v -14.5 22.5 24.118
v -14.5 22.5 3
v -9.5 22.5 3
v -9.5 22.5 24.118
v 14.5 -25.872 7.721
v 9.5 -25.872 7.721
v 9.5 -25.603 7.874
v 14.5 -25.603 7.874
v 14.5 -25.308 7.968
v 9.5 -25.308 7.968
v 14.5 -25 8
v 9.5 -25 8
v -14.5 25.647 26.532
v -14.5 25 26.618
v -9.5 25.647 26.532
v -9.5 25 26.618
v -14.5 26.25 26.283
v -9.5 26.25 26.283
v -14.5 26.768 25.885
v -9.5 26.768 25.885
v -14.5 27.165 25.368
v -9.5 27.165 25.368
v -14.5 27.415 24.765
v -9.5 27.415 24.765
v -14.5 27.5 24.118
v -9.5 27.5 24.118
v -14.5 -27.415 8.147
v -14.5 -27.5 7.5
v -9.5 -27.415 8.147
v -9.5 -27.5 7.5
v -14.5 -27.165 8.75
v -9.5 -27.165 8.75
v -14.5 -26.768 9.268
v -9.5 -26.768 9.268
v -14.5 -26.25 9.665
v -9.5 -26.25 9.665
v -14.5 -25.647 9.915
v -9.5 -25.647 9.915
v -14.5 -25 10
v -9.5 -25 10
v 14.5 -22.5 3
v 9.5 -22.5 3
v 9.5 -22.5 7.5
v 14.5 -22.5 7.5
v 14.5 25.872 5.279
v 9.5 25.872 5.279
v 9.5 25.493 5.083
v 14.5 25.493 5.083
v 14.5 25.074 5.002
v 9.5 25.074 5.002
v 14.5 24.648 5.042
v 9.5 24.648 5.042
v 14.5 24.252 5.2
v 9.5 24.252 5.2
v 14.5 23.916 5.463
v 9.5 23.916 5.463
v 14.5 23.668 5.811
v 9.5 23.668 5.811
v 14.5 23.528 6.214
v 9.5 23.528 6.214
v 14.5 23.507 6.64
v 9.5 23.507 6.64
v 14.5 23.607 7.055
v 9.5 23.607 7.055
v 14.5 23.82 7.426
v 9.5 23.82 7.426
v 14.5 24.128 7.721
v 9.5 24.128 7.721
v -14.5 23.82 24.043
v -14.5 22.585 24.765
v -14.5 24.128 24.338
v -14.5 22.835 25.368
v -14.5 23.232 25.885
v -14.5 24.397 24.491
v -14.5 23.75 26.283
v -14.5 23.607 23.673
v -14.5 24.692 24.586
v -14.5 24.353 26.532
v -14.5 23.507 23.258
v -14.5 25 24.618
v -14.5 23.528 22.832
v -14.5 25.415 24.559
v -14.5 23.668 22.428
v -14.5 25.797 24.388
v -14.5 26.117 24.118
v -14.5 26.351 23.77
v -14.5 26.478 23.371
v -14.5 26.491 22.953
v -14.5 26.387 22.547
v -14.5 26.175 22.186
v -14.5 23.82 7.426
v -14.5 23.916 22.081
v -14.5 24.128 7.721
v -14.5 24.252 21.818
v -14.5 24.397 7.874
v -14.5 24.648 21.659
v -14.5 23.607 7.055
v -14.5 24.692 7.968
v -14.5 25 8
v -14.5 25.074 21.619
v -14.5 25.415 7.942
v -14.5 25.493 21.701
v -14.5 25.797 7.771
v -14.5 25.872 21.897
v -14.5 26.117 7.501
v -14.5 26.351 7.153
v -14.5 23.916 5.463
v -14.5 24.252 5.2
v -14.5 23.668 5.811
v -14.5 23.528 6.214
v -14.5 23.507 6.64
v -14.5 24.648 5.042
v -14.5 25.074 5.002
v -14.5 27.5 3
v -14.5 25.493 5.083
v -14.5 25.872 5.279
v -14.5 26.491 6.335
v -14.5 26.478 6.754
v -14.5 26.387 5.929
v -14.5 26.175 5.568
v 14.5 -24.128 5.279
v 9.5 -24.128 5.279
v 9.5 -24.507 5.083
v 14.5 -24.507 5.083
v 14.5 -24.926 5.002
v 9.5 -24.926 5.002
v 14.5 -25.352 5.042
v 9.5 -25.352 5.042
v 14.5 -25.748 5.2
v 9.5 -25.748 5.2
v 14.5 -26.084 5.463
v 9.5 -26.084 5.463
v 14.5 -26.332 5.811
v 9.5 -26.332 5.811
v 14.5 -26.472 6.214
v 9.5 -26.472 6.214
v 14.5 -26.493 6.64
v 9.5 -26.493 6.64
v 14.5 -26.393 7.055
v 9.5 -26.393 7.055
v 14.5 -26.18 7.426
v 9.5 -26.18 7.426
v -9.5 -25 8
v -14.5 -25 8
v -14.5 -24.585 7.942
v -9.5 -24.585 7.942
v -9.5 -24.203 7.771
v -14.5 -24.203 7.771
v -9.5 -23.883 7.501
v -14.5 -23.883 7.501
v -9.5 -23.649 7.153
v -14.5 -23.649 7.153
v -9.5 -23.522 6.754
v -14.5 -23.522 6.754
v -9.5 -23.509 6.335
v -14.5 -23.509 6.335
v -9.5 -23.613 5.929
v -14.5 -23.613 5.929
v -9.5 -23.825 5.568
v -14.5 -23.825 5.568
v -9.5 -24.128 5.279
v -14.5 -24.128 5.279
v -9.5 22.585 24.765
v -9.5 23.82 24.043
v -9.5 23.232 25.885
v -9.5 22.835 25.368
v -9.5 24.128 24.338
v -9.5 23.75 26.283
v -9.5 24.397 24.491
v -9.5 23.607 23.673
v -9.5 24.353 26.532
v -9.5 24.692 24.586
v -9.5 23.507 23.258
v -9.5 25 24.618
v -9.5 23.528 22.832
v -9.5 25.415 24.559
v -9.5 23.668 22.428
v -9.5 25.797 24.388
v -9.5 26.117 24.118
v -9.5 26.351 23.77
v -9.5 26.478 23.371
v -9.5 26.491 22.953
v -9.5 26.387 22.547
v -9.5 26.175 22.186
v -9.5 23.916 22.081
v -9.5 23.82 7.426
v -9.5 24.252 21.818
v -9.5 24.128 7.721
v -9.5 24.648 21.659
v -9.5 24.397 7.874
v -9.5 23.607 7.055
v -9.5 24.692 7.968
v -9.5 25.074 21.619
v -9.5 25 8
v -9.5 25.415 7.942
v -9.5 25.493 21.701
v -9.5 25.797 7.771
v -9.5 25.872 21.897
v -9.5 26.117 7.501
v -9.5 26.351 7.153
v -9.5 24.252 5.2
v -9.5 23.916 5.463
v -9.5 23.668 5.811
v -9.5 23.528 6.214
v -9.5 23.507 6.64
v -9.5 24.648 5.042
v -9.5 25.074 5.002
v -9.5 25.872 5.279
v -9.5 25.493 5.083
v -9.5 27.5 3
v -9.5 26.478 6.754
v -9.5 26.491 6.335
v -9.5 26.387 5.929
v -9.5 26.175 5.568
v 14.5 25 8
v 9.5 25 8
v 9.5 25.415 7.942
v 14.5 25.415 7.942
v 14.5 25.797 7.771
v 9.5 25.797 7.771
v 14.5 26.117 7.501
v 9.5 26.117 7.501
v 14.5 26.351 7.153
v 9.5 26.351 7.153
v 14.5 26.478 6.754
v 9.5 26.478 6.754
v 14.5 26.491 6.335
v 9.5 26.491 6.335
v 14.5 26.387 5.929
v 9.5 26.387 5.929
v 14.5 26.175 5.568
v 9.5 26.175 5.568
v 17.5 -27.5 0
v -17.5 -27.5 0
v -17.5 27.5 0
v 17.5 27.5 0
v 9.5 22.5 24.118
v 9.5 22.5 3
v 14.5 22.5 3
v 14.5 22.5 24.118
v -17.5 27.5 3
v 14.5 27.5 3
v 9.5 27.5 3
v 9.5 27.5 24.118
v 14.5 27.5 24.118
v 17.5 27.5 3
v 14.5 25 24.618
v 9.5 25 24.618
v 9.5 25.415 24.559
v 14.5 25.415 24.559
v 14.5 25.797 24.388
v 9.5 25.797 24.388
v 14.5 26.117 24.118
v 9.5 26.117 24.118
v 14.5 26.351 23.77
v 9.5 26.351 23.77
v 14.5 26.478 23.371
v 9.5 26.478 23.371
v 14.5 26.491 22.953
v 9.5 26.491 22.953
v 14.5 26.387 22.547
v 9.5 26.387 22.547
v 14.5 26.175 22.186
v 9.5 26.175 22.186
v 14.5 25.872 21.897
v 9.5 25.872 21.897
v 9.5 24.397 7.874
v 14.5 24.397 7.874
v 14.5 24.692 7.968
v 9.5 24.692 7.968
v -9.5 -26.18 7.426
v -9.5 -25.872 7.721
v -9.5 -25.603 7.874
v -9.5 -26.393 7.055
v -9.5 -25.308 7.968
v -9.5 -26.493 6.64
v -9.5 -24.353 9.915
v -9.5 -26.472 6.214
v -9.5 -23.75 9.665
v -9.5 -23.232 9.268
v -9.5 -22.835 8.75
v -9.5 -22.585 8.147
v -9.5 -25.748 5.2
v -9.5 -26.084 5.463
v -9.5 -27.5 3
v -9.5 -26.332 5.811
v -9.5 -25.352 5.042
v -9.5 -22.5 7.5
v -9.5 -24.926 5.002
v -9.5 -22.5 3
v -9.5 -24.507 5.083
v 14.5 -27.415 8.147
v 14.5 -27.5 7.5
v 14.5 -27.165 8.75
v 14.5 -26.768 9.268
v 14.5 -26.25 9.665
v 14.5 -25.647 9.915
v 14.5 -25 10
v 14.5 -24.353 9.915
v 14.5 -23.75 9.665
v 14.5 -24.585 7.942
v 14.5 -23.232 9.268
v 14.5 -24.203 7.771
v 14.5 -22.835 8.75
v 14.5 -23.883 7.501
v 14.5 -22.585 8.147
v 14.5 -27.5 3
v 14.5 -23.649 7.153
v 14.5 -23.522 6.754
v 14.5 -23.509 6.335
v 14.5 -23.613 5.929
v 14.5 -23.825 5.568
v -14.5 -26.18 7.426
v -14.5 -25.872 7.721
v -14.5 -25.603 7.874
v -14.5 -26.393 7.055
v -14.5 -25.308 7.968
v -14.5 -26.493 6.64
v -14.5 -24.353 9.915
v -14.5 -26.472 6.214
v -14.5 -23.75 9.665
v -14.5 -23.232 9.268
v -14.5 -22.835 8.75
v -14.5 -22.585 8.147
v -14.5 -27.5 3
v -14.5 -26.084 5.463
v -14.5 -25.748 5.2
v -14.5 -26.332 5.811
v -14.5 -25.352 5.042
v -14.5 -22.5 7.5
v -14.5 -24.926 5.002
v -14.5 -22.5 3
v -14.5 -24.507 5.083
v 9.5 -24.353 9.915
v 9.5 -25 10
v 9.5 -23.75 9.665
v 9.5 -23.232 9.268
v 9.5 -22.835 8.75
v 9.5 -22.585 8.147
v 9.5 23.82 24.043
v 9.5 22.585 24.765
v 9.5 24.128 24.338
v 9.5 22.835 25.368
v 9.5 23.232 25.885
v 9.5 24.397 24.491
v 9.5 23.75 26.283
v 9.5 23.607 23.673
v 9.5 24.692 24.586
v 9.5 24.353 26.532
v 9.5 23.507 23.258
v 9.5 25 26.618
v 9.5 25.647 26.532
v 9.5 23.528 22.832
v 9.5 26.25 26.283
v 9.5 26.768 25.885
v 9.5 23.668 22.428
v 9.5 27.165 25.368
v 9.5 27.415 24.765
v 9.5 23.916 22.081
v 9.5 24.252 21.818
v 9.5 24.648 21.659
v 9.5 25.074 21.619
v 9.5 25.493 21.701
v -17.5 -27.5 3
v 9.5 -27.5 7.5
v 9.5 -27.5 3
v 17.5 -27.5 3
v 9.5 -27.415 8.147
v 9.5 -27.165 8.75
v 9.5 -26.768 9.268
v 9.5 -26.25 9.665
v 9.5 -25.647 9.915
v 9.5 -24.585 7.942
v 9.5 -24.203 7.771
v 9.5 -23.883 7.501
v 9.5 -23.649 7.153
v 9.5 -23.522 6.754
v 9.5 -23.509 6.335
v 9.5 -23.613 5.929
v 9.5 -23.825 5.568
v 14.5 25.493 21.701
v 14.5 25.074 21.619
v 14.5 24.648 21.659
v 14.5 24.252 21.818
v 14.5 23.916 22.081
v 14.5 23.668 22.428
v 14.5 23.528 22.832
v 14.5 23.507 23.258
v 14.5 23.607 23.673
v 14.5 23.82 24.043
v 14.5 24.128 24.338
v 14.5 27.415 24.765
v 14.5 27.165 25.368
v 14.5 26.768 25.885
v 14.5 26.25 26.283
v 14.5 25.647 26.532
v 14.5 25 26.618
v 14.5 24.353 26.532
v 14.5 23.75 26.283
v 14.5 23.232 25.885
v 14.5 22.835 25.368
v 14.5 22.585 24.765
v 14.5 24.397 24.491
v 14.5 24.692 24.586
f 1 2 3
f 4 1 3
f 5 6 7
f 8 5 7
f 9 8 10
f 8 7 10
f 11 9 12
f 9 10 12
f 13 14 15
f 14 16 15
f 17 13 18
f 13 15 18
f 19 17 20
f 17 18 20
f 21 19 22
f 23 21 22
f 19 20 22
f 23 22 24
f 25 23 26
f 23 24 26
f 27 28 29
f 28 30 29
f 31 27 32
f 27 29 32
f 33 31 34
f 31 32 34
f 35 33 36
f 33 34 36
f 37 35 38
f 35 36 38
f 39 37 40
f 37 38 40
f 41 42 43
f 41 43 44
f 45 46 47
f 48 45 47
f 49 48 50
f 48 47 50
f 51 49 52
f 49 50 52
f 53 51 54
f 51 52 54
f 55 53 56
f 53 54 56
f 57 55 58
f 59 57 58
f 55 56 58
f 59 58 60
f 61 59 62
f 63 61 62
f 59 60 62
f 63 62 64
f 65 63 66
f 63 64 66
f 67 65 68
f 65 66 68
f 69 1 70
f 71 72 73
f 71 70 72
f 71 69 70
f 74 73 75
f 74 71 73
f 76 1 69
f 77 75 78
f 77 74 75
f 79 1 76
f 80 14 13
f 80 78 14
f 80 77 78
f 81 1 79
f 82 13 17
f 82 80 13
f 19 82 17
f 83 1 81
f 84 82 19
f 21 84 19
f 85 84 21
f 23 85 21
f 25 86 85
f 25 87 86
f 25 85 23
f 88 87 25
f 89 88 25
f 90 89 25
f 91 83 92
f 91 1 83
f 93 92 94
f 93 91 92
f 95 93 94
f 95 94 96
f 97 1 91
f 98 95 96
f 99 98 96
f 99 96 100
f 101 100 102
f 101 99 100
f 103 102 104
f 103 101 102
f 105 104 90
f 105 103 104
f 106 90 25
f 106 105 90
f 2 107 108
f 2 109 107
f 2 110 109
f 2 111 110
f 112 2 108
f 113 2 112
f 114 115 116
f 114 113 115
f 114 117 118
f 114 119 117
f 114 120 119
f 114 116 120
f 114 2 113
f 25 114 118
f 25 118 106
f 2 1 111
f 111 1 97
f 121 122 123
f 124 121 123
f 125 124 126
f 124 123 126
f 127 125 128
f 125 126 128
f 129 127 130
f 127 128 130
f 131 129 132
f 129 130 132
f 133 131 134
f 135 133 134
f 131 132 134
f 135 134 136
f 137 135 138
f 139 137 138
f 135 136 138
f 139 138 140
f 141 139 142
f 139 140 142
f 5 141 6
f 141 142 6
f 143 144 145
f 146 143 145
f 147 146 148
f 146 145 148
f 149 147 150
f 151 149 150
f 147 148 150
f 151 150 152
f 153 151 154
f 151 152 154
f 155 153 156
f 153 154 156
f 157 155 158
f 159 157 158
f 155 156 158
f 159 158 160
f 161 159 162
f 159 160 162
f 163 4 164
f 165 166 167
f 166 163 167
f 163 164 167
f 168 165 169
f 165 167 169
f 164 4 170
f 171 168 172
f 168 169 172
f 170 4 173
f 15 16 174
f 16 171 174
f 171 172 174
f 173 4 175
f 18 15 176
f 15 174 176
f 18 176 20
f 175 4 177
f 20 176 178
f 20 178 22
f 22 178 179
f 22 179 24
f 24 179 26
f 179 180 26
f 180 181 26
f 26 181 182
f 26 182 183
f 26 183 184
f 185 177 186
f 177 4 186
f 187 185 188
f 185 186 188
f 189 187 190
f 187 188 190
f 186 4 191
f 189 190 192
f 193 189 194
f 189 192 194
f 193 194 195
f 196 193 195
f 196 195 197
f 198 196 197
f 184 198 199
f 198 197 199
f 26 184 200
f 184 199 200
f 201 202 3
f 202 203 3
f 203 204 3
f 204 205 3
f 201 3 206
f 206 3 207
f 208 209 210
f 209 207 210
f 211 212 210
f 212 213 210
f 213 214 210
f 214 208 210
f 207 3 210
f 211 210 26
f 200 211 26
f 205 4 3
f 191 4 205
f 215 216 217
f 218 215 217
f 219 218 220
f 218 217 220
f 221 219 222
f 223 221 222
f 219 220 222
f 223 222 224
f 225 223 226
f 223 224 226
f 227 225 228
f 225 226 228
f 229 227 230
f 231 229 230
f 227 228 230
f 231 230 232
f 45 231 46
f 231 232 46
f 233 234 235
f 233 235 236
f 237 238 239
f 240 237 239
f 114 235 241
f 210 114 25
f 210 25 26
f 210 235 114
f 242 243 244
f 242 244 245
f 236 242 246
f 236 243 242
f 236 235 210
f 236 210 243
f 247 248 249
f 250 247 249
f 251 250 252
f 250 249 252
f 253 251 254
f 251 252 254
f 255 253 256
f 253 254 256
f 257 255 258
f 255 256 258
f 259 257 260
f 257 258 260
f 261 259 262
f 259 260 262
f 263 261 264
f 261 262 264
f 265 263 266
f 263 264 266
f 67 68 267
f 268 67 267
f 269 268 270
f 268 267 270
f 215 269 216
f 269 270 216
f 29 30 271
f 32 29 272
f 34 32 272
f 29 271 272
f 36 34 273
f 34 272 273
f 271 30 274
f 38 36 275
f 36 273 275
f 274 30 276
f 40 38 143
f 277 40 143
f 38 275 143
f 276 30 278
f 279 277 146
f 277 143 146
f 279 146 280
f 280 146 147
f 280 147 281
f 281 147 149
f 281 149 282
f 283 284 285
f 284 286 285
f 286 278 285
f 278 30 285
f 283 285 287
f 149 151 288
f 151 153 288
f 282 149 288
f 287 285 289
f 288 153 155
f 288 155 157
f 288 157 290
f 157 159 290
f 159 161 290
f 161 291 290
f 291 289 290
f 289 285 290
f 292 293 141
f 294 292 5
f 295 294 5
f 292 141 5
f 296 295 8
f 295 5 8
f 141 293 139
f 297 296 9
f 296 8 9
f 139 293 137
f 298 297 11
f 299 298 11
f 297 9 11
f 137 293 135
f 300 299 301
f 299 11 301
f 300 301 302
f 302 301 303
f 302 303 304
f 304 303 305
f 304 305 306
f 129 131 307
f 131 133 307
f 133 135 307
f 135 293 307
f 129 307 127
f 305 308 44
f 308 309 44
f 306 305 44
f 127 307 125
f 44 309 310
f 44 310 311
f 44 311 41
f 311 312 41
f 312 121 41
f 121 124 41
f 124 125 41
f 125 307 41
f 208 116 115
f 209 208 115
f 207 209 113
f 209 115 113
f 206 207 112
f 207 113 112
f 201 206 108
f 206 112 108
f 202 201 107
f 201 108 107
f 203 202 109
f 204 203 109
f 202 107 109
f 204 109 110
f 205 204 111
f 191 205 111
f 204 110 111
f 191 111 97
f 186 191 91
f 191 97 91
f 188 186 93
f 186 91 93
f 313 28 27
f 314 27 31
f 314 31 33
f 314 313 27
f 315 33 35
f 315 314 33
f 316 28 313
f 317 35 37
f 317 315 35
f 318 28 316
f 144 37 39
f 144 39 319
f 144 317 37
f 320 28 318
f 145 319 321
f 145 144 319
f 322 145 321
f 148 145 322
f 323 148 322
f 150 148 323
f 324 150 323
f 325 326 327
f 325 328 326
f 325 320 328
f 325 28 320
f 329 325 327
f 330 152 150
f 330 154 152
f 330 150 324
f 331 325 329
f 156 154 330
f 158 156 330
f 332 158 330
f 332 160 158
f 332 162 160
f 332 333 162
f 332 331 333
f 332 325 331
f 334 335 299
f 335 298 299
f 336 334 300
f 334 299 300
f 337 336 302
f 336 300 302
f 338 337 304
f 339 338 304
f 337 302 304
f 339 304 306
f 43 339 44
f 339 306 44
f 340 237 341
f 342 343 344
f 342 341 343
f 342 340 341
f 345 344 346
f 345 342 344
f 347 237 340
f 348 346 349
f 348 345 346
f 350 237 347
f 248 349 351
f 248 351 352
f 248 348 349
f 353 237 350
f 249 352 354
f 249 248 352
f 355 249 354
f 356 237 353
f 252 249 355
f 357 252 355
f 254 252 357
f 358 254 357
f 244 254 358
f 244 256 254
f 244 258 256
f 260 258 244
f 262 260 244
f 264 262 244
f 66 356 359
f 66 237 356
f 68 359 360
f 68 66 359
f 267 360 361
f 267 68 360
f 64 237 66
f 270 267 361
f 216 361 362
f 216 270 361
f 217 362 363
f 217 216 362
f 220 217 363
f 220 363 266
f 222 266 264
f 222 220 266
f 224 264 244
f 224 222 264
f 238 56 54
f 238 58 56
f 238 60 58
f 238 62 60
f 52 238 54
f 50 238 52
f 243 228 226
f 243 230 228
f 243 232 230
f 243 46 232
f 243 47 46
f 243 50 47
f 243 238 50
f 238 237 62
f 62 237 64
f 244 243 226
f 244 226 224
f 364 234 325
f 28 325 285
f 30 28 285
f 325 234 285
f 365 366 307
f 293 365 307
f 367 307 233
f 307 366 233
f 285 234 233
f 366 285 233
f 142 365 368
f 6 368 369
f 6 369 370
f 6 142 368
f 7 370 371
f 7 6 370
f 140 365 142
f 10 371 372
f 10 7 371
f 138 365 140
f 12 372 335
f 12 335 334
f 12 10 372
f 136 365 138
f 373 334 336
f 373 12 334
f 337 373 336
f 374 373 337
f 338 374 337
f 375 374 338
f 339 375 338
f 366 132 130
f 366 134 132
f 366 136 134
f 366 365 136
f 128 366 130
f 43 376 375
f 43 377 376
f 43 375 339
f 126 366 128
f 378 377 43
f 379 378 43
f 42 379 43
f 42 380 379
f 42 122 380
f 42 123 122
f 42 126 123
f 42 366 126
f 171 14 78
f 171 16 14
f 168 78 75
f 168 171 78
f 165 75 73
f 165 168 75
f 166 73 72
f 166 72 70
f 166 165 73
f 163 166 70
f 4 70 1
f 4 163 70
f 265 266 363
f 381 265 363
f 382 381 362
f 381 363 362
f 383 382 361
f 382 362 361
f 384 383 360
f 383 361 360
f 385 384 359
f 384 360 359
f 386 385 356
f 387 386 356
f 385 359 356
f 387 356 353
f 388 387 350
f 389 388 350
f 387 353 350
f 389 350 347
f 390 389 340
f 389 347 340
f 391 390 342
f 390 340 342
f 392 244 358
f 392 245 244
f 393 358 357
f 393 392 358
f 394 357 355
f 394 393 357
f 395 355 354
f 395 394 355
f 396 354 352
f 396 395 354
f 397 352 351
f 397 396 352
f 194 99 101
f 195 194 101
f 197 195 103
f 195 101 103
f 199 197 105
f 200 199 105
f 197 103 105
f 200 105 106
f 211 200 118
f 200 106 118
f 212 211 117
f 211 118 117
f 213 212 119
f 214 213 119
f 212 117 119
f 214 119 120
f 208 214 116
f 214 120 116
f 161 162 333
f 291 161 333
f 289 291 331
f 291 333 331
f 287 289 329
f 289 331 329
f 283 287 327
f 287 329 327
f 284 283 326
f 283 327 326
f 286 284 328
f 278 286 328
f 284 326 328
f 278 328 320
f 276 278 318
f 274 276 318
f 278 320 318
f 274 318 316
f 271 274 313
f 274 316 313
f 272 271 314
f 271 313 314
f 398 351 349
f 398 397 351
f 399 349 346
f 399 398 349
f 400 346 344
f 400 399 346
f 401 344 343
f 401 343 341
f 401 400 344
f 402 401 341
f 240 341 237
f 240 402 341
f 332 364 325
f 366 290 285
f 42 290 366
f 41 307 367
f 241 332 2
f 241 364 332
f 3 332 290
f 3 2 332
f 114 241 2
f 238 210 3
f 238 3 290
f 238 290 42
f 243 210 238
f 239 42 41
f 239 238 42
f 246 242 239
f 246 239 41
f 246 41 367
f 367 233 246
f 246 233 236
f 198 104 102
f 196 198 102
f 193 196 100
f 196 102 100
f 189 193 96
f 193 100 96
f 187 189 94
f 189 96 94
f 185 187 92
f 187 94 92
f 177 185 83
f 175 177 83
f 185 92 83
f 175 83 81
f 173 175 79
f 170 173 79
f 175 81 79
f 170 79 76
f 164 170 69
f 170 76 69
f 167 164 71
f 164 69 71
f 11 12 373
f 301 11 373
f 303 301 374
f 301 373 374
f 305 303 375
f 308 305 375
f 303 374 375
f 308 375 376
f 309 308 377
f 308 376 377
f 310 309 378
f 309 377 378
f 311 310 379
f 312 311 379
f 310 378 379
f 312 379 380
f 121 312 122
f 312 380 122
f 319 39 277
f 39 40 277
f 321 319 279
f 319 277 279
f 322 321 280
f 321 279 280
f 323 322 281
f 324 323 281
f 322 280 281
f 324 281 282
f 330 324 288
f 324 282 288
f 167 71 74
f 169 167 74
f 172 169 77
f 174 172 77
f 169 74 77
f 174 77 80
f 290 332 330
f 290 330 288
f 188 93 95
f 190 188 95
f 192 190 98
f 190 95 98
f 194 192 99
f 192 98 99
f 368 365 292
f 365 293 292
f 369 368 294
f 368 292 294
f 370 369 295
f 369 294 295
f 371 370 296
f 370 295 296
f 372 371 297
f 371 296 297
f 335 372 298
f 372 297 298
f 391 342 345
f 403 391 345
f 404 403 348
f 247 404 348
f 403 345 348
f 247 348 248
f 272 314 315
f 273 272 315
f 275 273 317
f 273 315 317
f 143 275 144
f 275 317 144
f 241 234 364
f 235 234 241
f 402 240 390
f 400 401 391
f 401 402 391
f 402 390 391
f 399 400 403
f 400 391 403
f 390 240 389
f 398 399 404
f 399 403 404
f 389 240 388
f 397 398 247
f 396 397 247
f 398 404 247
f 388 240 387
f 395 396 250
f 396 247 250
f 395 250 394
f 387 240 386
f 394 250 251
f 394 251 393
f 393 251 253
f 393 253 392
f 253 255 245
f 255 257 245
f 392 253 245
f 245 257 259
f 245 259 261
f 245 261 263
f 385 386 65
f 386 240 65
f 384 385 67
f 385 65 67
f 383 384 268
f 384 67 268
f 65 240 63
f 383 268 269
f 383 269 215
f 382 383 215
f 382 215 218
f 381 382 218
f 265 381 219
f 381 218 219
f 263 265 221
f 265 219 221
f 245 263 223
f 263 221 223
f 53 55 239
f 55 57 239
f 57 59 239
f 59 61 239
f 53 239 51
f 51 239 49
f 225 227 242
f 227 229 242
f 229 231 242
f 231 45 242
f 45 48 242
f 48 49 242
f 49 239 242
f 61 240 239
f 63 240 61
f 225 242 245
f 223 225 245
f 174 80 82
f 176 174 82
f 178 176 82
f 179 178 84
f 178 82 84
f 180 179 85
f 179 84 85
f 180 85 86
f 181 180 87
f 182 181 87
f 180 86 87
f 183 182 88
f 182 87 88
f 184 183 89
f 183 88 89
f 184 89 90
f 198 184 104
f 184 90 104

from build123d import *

# Parameters (mm, degrees)
SKETCH1_W           = 35
SKETCH1_H           = 55
BOSS_EXTRUDE1_DEPTH = 3
SKETCH2_W           = 5
SKETCH2_H           = 5
BOSS_EXTRUDE2_DEPTH = 7
CUT_EXTRUDE1_REACH  = 45.362
FILLET1_R           = 2.5
SKETCH4_W           = 5
SKETCH4_H           = 5
BOSS_EXTRUDE3_DEPTH = 16.61764706
CUT_EXTRUDE2_REACH  = 51.887
FILLET2_R           = 2.5


with BuildPart() as part:
    # Sketch1 → Boss-Extrude1 (new body)
    with BuildSketch(Plane.XY):
        Rectangle(SKETCH1_W, SKETCH1_H)
    extrude(amount=BOSS_EXTRUDE1_DEPTH)

    # Sketch2 → Boss-Extrude2 (add)
    with BuildSketch(Plane.XY.offset(3)):
        with Locations((-12, 25)):
            Rectangle(SKETCH2_W, SKETCH2_H)
        with Locations((12, 25)):
            Rectangle(SKETCH2_W, SKETCH2_H)
        with Locations((-12, -25)):
            Rectangle(SKETCH2_W, SKETCH2_H)
        with Locations((12, -25)):
            Rectangle(SKETCH2_W, SKETCH2_H)
    extrude(amount=BOSS_EXTRUDE2_DEPTH)

    # Cut-Extrude1: up to this face of the body (flat: up to its plane)
    cut_extrude1_end = Plane(part.part.faces().sort_by_distance((14.5, 25, 6.5))[0])
    # Sketch3 → Cut-Extrude1 (cut, up to the picked face)
    with BuildSketch(Plane.ZY.offset(14.5), mode=Mode.PRIVATE) as cut_extrude1_sk1:
        with BuildLine():
            ThreePointArc((8, 25), (6.957766147, 26.428443263), (5.279399793, 25.871857291))
            Line((5.279399793, 25.871857291), (7.720600207, 24.128142709))
            ThreePointArc((7.720600207, 24.128142709), (7.928443263, 24.542233853), (8, 25))
        make_face()
    cut_extrude1_tool1 = split(extrude(cut_extrude1_sk1.sketch, amount=-CUT_EXTRUDE1_REACH, mode=Mode.PRIVATE), bisect_by=cut_extrude1_end, keep=Keep.BOTH, mode=Mode.PRIVATE)
    # Sketch3 → Cut-Extrude1 (cut, up to the picked face)
    with BuildSketch(Plane.ZY.offset(14.5), mode=Mode.PRIVATE) as cut_extrude1_sk2:
        with BuildLine():
            Line((7.720600207, 24.128142709), (5.279399793, 25.871857291))
            ThreePointArc((5.279399793, 25.871857291), (5.628142709, 23.779399793), (7.720600207, 24.128142709))
        make_face()
    cut_extrude1_tool2 = split(extrude(cut_extrude1_sk2.sketch, amount=-CUT_EXTRUDE1_REACH, mode=Mode.PRIVATE), bisect_by=cut_extrude1_end, keep=Keep.BOTH, mode=Mode.PRIVATE)
    # Sketch3 → Cut-Extrude1 (cut, up to the picked face)
    with BuildSketch(Plane.ZY.offset(14.5), mode=Mode.PRIVATE) as cut_extrude1_sk3:
        with BuildLine():
            ThreePointArc((8, 25), (6.957766147, 26.428443263), (5.279399793, 25.871857291))
            Line((5.279399793, 25.871857291), (7.720600207, 24.128142709))
            ThreePointArc((7.720600207, 24.128142709), (7.928443263, 24.542233853), (8, 25))
        make_face()
    cut_extrude1_tool3 = split(extrude(cut_extrude1_sk3.sketch, amount=-CUT_EXTRUDE1_REACH, mode=Mode.PRIVATE), bisect_by=cut_extrude1_end, keep=Keep.BOTH, mode=Mode.PRIVATE)
    # Sketch3 → Cut-Extrude1 (cut, up to the picked face)
    with BuildSketch(Plane.ZY.offset(14.5), mode=Mode.PRIVATE) as cut_extrude1_sk4:
        with BuildLine():
            Line((7.720600207, 24.128142709), (5.279399793, 25.871857291))
            ThreePointArc((5.279399793, 25.871857291), (5.628142709, 23.779399793), (7.720600207, 24.128142709))
        make_face()
    cut_extrude1_tool4 = split(extrude(cut_extrude1_sk4.sketch, amount=-CUT_EXTRUDE1_REACH, mode=Mode.PRIVATE), bisect_by=cut_extrude1_end, keep=Keep.BOTH, mode=Mode.PRIVATE)
    # Sketch3 → Cut-Extrude1 (cut, up to the picked face)
    with BuildSketch(Plane.ZY.offset(14.5), mode=Mode.PRIVATE) as cut_extrude1_sk5:
        with BuildLine():
            ThreePointArc((8, -25), (6.957766147, -23.571556737), (5.279399793, -24.128142709))
            Line((5.279399793, -24.128142709), (7.720600207, -25.871857291))
            ThreePointArc((7.720600207, -25.871857291), (7.928443263, -25.457766147), (8, -25))
        make_face()
    cut_extrude1_tool5 = split(extrude(cut_extrude1_sk5.sketch, amount=-CUT_EXTRUDE1_REACH, mode=Mode.PRIVATE), bisect_by=cut_extrude1_end, keep=Keep.BOTH, mode=Mode.PRIVATE)
    # Sketch3 → Cut-Extrude1 (cut, up to the picked face)
    with BuildSketch(Plane.ZY.offset(14.5), mode=Mode.PRIVATE) as cut_extrude1_sk6:
        with BuildLine():
            Line((7.720600207, -25.871857291), (5.279399793, -24.128142709))
            ThreePointArc((5.279399793, -24.128142709), (5.628142709, -26.220600207), (7.720600207, -25.871857291))
        make_face()
    cut_extrude1_tool6 = split(extrude(cut_extrude1_sk6.sketch, amount=-CUT_EXTRUDE1_REACH, mode=Mode.PRIVATE), bisect_by=cut_extrude1_end, keep=Keep.BOTH, mode=Mode.PRIVATE)
    # Sketch3 → Cut-Extrude1 (cut, up to the picked face)
    with BuildSketch(Plane.ZY.offset(14.5), mode=Mode.PRIVATE) as cut_extrude1_sk7:
        with BuildLine():
            ThreePointArc((8, -25), (6.957766147, -23.571556737), (5.279399793, -24.128142709))
            Line((5.279399793, -24.128142709), (7.720600207, -25.871857291))
            ThreePointArc((7.720600207, -25.871857291), (7.928443263, -25.457766147), (8, -25))
        make_face()
    cut_extrude1_tool7 = split(extrude(cut_extrude1_sk7.sketch, amount=-CUT_EXTRUDE1_REACH, mode=Mode.PRIVATE), bisect_by=cut_extrude1_end, keep=Keep.BOTH, mode=Mode.PRIVATE)
    # Sketch3 → Cut-Extrude1 (cut, up to the picked face)
    with BuildSketch(Plane.ZY.offset(14.5), mode=Mode.PRIVATE) as cut_extrude1_sk8:
        with BuildLine():
            Line((7.720600207, -25.871857291), (5.279399793, -24.128142709))
            ThreePointArc((5.279399793, -24.128142709), (5.628142709, -26.220600207), (7.720600207, -25.871857291))
        make_face()
    cut_extrude1_tool8 = split(extrude(cut_extrude1_sk8.sketch, amount=-CUT_EXTRUDE1_REACH, mode=Mode.PRIVATE), bisect_by=cut_extrude1_end, keep=Keep.BOTH, mode=Mode.PRIVATE)
    add(cut_extrude1_tool1.solids().sort_by(Axis((-14.5, 25.518039, 6.870028), (1, 0, 0)))[0], mode=Mode.SUBTRACT)
    add(cut_extrude1_tool2.solids().sort_by(Axis((-14.5, 24.481961, 6.129972), (1, 0, 0)))[0], mode=Mode.SUBTRACT)
    add(cut_extrude1_tool3.solids().sort_by(Axis((-14.5, 25.518039, 6.870028), (1, 0, 0)))[0], mode=Mode.SUBTRACT)
    add(cut_extrude1_tool4.solids().sort_by(Axis((-14.5, 24.481961, 6.129972), (1, 0, 0)))[0], mode=Mode.SUBTRACT)
    add(cut_extrude1_tool5.solids().sort_by(Axis((-14.5, -24.481961, 6.870028), (1, 0, 0)))[0], mode=Mode.SUBTRACT)
    add(cut_extrude1_tool6.solids().sort_by(Axis((-14.5, -25.518039, 6.129972), (1, 0, 0)))[0], mode=Mode.SUBTRACT)
    add(cut_extrude1_tool7.solids().sort_by(Axis((-14.5, -24.481961, 6.870028), (1, 0, 0)))[0], mode=Mode.SUBTRACT)
    add(cut_extrude1_tool8.solids().sort_by(Axis((-14.5, -25.518039, 6.129972), (1, 0, 0)))[0], mode=Mode.SUBTRACT)

    # Fillet1
    fillet1_edges = [part.edges().sort_by_distance(p)[0] for p in [
        (12, -27.5, 10),
        (12, -22.5, 10),
        (-12, -27.5, 10),
        (-12, -22.5, 10),
    ]]
    fillet(fillet1_edges, radius=FILLET1_R - 0.0001)  # a hair under: the kernel refuses the full size

    # Sketch4 → Boss-Extrude3 (add)
    with BuildSketch(Plane.XY.offset(10)):
        with Locations((-12, 25)):
            Rectangle(SKETCH4_W, SKETCH4_H)
        with Locations((12, 25)):
            Rectangle(SKETCH4_W, SKETCH4_H)
    extrude(amount=BOSS_EXTRUDE3_DEPTH)

    # Cut-Extrude2: up to this face of the body (flat: up to its plane)
    cut_extrude2_end = Plane(part.part.faces().sort_by_distance((14.5, 25, 15.337843498))[0])
    # Sketch5 → Cut-Extrude2 (cut, up to the picked face)
    with BuildSketch(Plane.ZY.offset(14.5), mode=Mode.PRIVATE) as cut_extrude2_sk1:
        with BuildLine():
            ThreePointArc((24.61764706, 25), (23.575413207, 26.428443263), (21.897046853, 25.871857291))
            Line((21.897046853, 25.871857291), (24.338247267, 24.128142709))
            ThreePointArc((24.338247267, 24.128142709), (24.546090323, 24.542233853), (24.61764706, 25))
        make_face()
    cut_extrude2_tool1 = split(extrude(cut_extrude2_sk1.sketch, amount=-CUT_EXTRUDE2_REACH, mode=Mode.PRIVATE), bisect_by=cut_extrude2_end, keep=Keep.BOTH, mode=Mode.PRIVATE)
    # Sketch5 → Cut-Extrude2 (cut, up to the picked face)
    with BuildSketch(Plane.ZY.offset(14.5), mode=Mode.PRIVATE) as cut_extrude2_sk2:
        with BuildLine():
            Line((24.338247267, 24.128142709), (21.897046853, 25.871857291))
            ThreePointArc((21.897046853, 25.871857291), (22.245789769, 23.779399793), (24.338247267, 24.128142709))
        make_face()
    cut_extrude2_tool2 = split(extrude(cut_extrude2_sk2.sketch, amount=-CUT_EXTRUDE2_REACH, mode=Mode.PRIVATE), bisect_by=cut_extrude2_end, keep=Keep.BOTH, mode=Mode.PRIVATE)
    # Sketch5 → Cut-Extrude2 (cut, up to the picked face)
    with BuildSketch(Plane.ZY.offset(14.5), mode=Mode.PRIVATE) as cut_extrude2_sk3:
        with BuildLine():
            ThreePointArc((24.61764706, 25), (23.575413207, 26.428443263), (21.897046853, 25.871857291))
            Line((21.897046853, 25.871857291), (24.338247267, 24.128142709))
            ThreePointArc((24.338247267, 24.128142709), (24.546090323, 24.542233853), (24.61764706, 25))
        make_face()
    cut_extrude2_tool3 = split(extrude(cut_extrude2_sk3.sketch, amount=-CUT_EXTRUDE2_REACH, mode=Mode.PRIVATE), bisect_by=cut_extrude2_end, keep=Keep.BOTH, mode=Mode.PRIVATE)
    # Sketch5 → Cut-Extrude2 (cut, up to the picked face)
    with BuildSketch(Plane.ZY.offset(14.5), mode=Mode.PRIVATE) as cut_extrude2_sk4:
        with BuildLine():
            Line((24.338247267, 24.128142709), (21.897046853, 25.871857291))
            ThreePointArc((21.897046853, 25.871857291), (22.245789769, 23.779399793), (24.338247267, 24.128142709))
        make_face()
    cut_extrude2_tool4 = split(extrude(cut_extrude2_sk4.sketch, amount=-CUT_EXTRUDE2_REACH, mode=Mode.PRIVATE), bisect_by=cut_extrude2_end, keep=Keep.BOTH, mode=Mode.PRIVATE)
    add(cut_extrude2_tool1.solids().sort_by(Axis((-14.5, 25.518039, 23.487675), (1, 0, 0)))[0], mode=Mode.SUBTRACT)
    add(cut_extrude2_tool2.solids().sort_by(Axis((-14.5, 24.481961, 22.747619), (1, 0, 0)))[0], mode=Mode.SUBTRACT)
    add(cut_extrude2_tool3.solids().sort_by(Axis((-14.5, 25.518039, 23.487675), (1, 0, 0)))[0], mode=Mode.SUBTRACT)
    add(cut_extrude2_tool4.solids().sort_by(Axis((-14.5, 24.481961, 22.747619), (1, 0, 0)))[0], mode=Mode.SUBTRACT)

    # Fillet2
    fillet2_edges = [part.edges().sort_by_distance(p)[0] for p in [
        (12, 22.5, 26.61764706),
        (12, 27.5, 26.61764706),
        (-12, 22.5, 26.61764706),
        (-12, 27.5, 26.61764706),
    ]]
    fillet(fillet2_edges, radius=FILLET2_R - 0.0001)  # a hair under: the kernel refuses the full size


solid = part.part
